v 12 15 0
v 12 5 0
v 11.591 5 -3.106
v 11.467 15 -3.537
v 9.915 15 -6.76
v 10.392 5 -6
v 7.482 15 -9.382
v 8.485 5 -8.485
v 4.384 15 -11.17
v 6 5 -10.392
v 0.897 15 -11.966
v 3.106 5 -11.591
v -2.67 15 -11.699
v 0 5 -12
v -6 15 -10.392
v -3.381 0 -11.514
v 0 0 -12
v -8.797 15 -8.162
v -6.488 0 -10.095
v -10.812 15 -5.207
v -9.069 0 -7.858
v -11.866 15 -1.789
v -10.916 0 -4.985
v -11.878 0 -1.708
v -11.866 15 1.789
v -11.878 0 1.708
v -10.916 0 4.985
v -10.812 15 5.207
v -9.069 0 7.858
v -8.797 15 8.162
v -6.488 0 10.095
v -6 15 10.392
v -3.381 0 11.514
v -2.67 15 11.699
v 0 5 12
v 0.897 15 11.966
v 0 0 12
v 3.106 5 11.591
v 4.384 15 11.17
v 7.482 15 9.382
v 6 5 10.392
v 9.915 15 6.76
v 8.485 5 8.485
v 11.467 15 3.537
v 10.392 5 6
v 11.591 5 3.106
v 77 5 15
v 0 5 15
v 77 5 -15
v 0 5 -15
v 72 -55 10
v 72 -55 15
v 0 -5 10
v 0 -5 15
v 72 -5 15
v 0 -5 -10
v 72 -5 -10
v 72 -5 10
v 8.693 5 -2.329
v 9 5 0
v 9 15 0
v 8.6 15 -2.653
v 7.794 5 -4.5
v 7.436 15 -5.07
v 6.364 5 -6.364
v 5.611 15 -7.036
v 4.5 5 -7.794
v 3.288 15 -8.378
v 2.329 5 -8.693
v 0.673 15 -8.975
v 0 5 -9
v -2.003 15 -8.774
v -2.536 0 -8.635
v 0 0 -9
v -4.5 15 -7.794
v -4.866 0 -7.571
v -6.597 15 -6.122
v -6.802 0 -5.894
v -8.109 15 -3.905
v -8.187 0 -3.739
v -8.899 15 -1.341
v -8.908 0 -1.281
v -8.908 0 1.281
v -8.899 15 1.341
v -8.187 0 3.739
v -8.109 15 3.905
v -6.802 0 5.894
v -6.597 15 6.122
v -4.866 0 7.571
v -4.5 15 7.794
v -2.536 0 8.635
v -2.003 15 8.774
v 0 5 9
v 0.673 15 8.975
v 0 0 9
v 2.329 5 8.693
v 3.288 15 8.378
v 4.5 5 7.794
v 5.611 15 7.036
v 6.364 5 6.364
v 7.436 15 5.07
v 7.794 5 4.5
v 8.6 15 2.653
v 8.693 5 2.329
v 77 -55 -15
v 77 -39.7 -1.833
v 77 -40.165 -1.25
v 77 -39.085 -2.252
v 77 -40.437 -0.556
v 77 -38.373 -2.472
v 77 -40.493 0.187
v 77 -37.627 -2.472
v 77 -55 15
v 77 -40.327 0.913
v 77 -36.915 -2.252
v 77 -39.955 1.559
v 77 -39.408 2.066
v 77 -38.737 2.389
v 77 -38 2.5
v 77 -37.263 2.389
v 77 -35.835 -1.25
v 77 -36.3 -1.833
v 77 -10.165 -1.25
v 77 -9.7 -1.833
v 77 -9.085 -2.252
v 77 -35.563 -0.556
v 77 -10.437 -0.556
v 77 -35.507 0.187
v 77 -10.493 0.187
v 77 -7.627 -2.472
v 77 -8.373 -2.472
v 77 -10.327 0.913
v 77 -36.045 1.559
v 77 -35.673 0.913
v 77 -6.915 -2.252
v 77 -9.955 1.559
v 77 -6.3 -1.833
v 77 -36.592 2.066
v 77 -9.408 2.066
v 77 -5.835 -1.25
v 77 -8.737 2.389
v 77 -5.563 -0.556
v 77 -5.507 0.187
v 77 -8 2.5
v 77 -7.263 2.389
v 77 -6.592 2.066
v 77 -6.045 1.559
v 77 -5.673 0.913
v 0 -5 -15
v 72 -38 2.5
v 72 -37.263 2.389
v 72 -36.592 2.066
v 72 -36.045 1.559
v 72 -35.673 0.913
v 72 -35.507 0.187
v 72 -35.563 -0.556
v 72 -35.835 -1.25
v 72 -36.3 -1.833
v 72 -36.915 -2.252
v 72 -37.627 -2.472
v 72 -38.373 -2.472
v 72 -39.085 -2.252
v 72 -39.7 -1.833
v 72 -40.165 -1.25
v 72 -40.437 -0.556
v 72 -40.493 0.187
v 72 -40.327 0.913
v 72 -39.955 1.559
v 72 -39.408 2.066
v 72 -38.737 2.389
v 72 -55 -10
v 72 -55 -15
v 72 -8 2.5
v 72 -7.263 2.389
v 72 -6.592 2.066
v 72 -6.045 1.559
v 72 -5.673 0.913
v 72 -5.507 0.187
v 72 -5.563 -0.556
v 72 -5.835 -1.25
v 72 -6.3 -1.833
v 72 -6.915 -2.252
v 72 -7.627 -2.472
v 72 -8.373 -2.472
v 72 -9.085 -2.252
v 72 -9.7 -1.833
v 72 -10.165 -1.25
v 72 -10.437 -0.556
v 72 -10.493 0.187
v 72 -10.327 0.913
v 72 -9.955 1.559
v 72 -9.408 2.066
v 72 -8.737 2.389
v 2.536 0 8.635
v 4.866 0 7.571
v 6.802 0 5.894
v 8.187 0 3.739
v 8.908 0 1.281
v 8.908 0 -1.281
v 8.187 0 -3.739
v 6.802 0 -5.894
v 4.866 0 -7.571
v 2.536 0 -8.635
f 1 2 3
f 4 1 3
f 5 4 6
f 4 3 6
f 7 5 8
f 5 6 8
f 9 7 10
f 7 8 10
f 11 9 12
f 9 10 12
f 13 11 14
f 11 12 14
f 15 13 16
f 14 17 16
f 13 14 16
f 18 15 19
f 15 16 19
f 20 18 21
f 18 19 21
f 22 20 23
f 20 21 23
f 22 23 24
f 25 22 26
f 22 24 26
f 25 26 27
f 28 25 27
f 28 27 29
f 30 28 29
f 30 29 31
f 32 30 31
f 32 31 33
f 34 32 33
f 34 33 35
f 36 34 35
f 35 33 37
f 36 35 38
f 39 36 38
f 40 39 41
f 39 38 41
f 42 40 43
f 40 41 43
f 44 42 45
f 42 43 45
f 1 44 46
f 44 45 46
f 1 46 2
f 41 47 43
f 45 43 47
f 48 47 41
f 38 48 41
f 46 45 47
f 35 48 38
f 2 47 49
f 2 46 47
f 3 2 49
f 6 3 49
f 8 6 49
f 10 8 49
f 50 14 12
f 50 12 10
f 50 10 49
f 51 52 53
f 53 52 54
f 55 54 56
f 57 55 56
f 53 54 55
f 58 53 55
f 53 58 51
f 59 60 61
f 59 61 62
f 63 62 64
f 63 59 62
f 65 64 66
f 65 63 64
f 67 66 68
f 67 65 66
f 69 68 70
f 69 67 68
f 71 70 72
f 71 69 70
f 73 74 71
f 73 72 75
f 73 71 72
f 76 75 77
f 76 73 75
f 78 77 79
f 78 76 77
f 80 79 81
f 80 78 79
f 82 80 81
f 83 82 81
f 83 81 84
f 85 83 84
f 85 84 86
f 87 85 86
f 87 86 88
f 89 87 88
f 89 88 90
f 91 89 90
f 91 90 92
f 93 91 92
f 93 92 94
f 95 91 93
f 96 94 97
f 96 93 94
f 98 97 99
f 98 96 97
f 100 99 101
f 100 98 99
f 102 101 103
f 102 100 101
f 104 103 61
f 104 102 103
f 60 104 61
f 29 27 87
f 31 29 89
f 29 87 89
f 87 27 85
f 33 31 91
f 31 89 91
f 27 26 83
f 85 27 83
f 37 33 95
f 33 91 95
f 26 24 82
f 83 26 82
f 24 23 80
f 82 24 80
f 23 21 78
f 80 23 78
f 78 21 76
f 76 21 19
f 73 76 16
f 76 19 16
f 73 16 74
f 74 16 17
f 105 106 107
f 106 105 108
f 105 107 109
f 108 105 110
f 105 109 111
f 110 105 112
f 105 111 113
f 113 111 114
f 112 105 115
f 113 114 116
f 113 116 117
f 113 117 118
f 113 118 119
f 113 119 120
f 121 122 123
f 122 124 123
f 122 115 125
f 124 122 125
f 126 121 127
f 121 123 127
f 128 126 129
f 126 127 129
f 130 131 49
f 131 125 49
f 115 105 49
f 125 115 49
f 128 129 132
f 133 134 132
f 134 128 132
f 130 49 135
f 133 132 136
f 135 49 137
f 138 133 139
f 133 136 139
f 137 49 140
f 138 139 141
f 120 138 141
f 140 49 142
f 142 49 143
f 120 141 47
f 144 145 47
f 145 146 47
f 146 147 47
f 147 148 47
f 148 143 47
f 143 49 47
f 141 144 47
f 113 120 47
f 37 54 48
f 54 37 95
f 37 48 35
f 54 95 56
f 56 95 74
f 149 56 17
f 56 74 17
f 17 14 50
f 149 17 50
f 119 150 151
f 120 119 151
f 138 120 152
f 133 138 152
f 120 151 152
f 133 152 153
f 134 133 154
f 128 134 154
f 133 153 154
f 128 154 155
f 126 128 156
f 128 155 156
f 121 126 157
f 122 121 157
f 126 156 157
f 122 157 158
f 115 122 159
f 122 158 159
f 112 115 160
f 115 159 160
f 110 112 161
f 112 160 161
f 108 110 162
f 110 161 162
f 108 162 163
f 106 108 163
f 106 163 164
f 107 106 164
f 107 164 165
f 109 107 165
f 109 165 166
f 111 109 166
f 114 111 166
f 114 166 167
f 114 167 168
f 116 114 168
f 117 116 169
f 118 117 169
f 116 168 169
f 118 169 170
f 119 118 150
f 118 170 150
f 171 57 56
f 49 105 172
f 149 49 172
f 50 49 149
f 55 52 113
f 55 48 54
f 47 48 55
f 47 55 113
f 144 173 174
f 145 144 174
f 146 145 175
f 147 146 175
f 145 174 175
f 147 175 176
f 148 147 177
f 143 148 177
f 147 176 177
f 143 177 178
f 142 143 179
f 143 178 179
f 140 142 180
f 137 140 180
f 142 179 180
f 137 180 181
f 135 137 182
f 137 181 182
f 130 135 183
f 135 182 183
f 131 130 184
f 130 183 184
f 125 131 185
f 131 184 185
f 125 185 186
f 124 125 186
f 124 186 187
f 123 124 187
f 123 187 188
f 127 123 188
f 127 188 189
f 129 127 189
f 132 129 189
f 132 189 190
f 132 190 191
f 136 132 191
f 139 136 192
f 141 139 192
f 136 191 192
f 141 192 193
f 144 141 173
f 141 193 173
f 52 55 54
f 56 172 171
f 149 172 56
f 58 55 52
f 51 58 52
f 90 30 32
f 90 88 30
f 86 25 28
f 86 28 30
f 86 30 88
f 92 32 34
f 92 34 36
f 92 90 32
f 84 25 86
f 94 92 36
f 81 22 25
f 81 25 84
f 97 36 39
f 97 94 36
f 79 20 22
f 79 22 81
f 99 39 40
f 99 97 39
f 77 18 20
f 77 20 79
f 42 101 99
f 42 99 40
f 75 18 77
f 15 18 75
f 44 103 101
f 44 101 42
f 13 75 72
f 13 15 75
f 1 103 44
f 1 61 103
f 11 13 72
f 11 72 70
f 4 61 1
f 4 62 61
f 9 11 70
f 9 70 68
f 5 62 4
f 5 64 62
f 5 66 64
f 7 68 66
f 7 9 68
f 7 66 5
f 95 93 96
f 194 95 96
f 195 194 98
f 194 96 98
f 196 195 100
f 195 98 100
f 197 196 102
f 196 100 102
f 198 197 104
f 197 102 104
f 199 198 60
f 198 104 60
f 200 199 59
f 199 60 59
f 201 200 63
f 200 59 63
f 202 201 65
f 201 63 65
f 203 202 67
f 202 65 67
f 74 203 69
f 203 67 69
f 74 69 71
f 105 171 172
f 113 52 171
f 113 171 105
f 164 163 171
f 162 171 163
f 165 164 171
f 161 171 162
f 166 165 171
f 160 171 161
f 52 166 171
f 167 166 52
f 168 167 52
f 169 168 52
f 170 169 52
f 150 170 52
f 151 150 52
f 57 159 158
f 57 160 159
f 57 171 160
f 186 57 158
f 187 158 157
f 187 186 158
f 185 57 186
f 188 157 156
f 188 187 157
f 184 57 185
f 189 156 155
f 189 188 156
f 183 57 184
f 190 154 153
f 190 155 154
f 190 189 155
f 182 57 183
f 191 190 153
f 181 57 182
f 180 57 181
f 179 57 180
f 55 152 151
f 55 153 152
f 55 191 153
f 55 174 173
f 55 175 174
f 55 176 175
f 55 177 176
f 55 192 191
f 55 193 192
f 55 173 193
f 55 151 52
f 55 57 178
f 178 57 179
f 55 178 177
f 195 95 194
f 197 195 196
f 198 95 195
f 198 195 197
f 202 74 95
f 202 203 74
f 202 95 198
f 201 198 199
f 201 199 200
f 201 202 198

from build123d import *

# Parameters (mm, degrees)
SKETCH1_R           = 12
SKETCH1_R_2         = 9
BOSS_EXTRUDE1_DEPTH = 15
SKETCH2_W           = 30
SKETCH2_H           = 10
BOSS_EXTRUDE2_DEPTH = 77
CUT_EXTRUDE3_DEPTH  = 5
SKETCH5_W           = 5
SKETCH5_H           = 30
BOSS_EXTRUDE3_DEPTH = 50
SKETCH6_R           = 2.5
CUT_EXTRUDE4_DEPTH  = 5
BOSS_EXTRUDE4_DEPTH = 5
BOSS_EXTRUDE5_DEPTH = 5


with BuildPart() as part:
    # Sketch1 → Boss-Extrude1 (new body)
    with BuildSketch(Plane(origin=(0, 0, 0), x_dir=(1, 0, 0), z_dir=(0, 1, 0))):
        Circle(SKETCH1_R)
        Circle(SKETCH1_R_2, mode=Mode.SUBTRACT)
    extrude(amount=BOSS_EXTRUDE1_DEPTH)

    # Sketch2 → Boss-Extrude2 (add)
    with BuildSketch(Plane(origin=(0, 0, 0), x_dir=(0, 0, -1), z_dir=(1, 0, 0))):
        Rectangle(SKETCH2_W, SKETCH2_H)
    extrude(amount=BOSS_EXTRUDE2_DEPTH)

    # Sketch4 → Cut-Extrude3 (cut)
    with BuildSketch(Plane(origin=(0, 5, 0), x_dir=(1, 0, 0), z_dir=(0, 1, 0))):
        with BuildLine():
            Line((0, 9), (0, -9))
            ThreePointArc((0, -9), (9, 0), (0, 9))
        make_face()
    extrude(amount=-CUT_EXTRUDE3_DEPTH, mode=Mode.SUBTRACT)

    # Sketch5 → Boss-Extrude3 (add)
    with BuildSketch(Plane.XZ.offset(5)):
        with Locations((74.5, 0)):
            Rectangle(SKETCH5_W, SKETCH5_H)
    extrude(amount=BOSS_EXTRUDE3_DEPTH)

    # Sketch6 → Cut-Extrude4 (cut)
    with BuildSketch(Plane.ZY.offset(-72)):
        with Locations((0, -8)):
            Circle(SKETCH6_R)
        with Locations((0, -38)):
            Circle(SKETCH6_R)
    extrude(amount=-CUT_EXTRUDE4_DEPTH, mode=Mode.SUBTRACT)

    # Sketch7 → Boss-Extrude4 (add)
    with BuildSketch(Plane(origin=(0, 0, -15), x_dir=(-1, 0, 0), z_dir=(0, 0, -1))):
        Polygon((-72, -55), (0, -5), (-72, -5), align=None)
    extrude(amount=-BOSS_EXTRUDE4_DEPTH)


with BuildPart() as body_2:
    # Sketch8 → Boss-Extrude5 (new body)
    with BuildSketch(Plane.XY.offset(15)):
        Polygon((0, -5), (72, -5), (72, -55), align=None)
    extrude(amount=-BOSS_EXTRUDE5_DEPTH)


solid = Compound([part.part, body_2.part])
